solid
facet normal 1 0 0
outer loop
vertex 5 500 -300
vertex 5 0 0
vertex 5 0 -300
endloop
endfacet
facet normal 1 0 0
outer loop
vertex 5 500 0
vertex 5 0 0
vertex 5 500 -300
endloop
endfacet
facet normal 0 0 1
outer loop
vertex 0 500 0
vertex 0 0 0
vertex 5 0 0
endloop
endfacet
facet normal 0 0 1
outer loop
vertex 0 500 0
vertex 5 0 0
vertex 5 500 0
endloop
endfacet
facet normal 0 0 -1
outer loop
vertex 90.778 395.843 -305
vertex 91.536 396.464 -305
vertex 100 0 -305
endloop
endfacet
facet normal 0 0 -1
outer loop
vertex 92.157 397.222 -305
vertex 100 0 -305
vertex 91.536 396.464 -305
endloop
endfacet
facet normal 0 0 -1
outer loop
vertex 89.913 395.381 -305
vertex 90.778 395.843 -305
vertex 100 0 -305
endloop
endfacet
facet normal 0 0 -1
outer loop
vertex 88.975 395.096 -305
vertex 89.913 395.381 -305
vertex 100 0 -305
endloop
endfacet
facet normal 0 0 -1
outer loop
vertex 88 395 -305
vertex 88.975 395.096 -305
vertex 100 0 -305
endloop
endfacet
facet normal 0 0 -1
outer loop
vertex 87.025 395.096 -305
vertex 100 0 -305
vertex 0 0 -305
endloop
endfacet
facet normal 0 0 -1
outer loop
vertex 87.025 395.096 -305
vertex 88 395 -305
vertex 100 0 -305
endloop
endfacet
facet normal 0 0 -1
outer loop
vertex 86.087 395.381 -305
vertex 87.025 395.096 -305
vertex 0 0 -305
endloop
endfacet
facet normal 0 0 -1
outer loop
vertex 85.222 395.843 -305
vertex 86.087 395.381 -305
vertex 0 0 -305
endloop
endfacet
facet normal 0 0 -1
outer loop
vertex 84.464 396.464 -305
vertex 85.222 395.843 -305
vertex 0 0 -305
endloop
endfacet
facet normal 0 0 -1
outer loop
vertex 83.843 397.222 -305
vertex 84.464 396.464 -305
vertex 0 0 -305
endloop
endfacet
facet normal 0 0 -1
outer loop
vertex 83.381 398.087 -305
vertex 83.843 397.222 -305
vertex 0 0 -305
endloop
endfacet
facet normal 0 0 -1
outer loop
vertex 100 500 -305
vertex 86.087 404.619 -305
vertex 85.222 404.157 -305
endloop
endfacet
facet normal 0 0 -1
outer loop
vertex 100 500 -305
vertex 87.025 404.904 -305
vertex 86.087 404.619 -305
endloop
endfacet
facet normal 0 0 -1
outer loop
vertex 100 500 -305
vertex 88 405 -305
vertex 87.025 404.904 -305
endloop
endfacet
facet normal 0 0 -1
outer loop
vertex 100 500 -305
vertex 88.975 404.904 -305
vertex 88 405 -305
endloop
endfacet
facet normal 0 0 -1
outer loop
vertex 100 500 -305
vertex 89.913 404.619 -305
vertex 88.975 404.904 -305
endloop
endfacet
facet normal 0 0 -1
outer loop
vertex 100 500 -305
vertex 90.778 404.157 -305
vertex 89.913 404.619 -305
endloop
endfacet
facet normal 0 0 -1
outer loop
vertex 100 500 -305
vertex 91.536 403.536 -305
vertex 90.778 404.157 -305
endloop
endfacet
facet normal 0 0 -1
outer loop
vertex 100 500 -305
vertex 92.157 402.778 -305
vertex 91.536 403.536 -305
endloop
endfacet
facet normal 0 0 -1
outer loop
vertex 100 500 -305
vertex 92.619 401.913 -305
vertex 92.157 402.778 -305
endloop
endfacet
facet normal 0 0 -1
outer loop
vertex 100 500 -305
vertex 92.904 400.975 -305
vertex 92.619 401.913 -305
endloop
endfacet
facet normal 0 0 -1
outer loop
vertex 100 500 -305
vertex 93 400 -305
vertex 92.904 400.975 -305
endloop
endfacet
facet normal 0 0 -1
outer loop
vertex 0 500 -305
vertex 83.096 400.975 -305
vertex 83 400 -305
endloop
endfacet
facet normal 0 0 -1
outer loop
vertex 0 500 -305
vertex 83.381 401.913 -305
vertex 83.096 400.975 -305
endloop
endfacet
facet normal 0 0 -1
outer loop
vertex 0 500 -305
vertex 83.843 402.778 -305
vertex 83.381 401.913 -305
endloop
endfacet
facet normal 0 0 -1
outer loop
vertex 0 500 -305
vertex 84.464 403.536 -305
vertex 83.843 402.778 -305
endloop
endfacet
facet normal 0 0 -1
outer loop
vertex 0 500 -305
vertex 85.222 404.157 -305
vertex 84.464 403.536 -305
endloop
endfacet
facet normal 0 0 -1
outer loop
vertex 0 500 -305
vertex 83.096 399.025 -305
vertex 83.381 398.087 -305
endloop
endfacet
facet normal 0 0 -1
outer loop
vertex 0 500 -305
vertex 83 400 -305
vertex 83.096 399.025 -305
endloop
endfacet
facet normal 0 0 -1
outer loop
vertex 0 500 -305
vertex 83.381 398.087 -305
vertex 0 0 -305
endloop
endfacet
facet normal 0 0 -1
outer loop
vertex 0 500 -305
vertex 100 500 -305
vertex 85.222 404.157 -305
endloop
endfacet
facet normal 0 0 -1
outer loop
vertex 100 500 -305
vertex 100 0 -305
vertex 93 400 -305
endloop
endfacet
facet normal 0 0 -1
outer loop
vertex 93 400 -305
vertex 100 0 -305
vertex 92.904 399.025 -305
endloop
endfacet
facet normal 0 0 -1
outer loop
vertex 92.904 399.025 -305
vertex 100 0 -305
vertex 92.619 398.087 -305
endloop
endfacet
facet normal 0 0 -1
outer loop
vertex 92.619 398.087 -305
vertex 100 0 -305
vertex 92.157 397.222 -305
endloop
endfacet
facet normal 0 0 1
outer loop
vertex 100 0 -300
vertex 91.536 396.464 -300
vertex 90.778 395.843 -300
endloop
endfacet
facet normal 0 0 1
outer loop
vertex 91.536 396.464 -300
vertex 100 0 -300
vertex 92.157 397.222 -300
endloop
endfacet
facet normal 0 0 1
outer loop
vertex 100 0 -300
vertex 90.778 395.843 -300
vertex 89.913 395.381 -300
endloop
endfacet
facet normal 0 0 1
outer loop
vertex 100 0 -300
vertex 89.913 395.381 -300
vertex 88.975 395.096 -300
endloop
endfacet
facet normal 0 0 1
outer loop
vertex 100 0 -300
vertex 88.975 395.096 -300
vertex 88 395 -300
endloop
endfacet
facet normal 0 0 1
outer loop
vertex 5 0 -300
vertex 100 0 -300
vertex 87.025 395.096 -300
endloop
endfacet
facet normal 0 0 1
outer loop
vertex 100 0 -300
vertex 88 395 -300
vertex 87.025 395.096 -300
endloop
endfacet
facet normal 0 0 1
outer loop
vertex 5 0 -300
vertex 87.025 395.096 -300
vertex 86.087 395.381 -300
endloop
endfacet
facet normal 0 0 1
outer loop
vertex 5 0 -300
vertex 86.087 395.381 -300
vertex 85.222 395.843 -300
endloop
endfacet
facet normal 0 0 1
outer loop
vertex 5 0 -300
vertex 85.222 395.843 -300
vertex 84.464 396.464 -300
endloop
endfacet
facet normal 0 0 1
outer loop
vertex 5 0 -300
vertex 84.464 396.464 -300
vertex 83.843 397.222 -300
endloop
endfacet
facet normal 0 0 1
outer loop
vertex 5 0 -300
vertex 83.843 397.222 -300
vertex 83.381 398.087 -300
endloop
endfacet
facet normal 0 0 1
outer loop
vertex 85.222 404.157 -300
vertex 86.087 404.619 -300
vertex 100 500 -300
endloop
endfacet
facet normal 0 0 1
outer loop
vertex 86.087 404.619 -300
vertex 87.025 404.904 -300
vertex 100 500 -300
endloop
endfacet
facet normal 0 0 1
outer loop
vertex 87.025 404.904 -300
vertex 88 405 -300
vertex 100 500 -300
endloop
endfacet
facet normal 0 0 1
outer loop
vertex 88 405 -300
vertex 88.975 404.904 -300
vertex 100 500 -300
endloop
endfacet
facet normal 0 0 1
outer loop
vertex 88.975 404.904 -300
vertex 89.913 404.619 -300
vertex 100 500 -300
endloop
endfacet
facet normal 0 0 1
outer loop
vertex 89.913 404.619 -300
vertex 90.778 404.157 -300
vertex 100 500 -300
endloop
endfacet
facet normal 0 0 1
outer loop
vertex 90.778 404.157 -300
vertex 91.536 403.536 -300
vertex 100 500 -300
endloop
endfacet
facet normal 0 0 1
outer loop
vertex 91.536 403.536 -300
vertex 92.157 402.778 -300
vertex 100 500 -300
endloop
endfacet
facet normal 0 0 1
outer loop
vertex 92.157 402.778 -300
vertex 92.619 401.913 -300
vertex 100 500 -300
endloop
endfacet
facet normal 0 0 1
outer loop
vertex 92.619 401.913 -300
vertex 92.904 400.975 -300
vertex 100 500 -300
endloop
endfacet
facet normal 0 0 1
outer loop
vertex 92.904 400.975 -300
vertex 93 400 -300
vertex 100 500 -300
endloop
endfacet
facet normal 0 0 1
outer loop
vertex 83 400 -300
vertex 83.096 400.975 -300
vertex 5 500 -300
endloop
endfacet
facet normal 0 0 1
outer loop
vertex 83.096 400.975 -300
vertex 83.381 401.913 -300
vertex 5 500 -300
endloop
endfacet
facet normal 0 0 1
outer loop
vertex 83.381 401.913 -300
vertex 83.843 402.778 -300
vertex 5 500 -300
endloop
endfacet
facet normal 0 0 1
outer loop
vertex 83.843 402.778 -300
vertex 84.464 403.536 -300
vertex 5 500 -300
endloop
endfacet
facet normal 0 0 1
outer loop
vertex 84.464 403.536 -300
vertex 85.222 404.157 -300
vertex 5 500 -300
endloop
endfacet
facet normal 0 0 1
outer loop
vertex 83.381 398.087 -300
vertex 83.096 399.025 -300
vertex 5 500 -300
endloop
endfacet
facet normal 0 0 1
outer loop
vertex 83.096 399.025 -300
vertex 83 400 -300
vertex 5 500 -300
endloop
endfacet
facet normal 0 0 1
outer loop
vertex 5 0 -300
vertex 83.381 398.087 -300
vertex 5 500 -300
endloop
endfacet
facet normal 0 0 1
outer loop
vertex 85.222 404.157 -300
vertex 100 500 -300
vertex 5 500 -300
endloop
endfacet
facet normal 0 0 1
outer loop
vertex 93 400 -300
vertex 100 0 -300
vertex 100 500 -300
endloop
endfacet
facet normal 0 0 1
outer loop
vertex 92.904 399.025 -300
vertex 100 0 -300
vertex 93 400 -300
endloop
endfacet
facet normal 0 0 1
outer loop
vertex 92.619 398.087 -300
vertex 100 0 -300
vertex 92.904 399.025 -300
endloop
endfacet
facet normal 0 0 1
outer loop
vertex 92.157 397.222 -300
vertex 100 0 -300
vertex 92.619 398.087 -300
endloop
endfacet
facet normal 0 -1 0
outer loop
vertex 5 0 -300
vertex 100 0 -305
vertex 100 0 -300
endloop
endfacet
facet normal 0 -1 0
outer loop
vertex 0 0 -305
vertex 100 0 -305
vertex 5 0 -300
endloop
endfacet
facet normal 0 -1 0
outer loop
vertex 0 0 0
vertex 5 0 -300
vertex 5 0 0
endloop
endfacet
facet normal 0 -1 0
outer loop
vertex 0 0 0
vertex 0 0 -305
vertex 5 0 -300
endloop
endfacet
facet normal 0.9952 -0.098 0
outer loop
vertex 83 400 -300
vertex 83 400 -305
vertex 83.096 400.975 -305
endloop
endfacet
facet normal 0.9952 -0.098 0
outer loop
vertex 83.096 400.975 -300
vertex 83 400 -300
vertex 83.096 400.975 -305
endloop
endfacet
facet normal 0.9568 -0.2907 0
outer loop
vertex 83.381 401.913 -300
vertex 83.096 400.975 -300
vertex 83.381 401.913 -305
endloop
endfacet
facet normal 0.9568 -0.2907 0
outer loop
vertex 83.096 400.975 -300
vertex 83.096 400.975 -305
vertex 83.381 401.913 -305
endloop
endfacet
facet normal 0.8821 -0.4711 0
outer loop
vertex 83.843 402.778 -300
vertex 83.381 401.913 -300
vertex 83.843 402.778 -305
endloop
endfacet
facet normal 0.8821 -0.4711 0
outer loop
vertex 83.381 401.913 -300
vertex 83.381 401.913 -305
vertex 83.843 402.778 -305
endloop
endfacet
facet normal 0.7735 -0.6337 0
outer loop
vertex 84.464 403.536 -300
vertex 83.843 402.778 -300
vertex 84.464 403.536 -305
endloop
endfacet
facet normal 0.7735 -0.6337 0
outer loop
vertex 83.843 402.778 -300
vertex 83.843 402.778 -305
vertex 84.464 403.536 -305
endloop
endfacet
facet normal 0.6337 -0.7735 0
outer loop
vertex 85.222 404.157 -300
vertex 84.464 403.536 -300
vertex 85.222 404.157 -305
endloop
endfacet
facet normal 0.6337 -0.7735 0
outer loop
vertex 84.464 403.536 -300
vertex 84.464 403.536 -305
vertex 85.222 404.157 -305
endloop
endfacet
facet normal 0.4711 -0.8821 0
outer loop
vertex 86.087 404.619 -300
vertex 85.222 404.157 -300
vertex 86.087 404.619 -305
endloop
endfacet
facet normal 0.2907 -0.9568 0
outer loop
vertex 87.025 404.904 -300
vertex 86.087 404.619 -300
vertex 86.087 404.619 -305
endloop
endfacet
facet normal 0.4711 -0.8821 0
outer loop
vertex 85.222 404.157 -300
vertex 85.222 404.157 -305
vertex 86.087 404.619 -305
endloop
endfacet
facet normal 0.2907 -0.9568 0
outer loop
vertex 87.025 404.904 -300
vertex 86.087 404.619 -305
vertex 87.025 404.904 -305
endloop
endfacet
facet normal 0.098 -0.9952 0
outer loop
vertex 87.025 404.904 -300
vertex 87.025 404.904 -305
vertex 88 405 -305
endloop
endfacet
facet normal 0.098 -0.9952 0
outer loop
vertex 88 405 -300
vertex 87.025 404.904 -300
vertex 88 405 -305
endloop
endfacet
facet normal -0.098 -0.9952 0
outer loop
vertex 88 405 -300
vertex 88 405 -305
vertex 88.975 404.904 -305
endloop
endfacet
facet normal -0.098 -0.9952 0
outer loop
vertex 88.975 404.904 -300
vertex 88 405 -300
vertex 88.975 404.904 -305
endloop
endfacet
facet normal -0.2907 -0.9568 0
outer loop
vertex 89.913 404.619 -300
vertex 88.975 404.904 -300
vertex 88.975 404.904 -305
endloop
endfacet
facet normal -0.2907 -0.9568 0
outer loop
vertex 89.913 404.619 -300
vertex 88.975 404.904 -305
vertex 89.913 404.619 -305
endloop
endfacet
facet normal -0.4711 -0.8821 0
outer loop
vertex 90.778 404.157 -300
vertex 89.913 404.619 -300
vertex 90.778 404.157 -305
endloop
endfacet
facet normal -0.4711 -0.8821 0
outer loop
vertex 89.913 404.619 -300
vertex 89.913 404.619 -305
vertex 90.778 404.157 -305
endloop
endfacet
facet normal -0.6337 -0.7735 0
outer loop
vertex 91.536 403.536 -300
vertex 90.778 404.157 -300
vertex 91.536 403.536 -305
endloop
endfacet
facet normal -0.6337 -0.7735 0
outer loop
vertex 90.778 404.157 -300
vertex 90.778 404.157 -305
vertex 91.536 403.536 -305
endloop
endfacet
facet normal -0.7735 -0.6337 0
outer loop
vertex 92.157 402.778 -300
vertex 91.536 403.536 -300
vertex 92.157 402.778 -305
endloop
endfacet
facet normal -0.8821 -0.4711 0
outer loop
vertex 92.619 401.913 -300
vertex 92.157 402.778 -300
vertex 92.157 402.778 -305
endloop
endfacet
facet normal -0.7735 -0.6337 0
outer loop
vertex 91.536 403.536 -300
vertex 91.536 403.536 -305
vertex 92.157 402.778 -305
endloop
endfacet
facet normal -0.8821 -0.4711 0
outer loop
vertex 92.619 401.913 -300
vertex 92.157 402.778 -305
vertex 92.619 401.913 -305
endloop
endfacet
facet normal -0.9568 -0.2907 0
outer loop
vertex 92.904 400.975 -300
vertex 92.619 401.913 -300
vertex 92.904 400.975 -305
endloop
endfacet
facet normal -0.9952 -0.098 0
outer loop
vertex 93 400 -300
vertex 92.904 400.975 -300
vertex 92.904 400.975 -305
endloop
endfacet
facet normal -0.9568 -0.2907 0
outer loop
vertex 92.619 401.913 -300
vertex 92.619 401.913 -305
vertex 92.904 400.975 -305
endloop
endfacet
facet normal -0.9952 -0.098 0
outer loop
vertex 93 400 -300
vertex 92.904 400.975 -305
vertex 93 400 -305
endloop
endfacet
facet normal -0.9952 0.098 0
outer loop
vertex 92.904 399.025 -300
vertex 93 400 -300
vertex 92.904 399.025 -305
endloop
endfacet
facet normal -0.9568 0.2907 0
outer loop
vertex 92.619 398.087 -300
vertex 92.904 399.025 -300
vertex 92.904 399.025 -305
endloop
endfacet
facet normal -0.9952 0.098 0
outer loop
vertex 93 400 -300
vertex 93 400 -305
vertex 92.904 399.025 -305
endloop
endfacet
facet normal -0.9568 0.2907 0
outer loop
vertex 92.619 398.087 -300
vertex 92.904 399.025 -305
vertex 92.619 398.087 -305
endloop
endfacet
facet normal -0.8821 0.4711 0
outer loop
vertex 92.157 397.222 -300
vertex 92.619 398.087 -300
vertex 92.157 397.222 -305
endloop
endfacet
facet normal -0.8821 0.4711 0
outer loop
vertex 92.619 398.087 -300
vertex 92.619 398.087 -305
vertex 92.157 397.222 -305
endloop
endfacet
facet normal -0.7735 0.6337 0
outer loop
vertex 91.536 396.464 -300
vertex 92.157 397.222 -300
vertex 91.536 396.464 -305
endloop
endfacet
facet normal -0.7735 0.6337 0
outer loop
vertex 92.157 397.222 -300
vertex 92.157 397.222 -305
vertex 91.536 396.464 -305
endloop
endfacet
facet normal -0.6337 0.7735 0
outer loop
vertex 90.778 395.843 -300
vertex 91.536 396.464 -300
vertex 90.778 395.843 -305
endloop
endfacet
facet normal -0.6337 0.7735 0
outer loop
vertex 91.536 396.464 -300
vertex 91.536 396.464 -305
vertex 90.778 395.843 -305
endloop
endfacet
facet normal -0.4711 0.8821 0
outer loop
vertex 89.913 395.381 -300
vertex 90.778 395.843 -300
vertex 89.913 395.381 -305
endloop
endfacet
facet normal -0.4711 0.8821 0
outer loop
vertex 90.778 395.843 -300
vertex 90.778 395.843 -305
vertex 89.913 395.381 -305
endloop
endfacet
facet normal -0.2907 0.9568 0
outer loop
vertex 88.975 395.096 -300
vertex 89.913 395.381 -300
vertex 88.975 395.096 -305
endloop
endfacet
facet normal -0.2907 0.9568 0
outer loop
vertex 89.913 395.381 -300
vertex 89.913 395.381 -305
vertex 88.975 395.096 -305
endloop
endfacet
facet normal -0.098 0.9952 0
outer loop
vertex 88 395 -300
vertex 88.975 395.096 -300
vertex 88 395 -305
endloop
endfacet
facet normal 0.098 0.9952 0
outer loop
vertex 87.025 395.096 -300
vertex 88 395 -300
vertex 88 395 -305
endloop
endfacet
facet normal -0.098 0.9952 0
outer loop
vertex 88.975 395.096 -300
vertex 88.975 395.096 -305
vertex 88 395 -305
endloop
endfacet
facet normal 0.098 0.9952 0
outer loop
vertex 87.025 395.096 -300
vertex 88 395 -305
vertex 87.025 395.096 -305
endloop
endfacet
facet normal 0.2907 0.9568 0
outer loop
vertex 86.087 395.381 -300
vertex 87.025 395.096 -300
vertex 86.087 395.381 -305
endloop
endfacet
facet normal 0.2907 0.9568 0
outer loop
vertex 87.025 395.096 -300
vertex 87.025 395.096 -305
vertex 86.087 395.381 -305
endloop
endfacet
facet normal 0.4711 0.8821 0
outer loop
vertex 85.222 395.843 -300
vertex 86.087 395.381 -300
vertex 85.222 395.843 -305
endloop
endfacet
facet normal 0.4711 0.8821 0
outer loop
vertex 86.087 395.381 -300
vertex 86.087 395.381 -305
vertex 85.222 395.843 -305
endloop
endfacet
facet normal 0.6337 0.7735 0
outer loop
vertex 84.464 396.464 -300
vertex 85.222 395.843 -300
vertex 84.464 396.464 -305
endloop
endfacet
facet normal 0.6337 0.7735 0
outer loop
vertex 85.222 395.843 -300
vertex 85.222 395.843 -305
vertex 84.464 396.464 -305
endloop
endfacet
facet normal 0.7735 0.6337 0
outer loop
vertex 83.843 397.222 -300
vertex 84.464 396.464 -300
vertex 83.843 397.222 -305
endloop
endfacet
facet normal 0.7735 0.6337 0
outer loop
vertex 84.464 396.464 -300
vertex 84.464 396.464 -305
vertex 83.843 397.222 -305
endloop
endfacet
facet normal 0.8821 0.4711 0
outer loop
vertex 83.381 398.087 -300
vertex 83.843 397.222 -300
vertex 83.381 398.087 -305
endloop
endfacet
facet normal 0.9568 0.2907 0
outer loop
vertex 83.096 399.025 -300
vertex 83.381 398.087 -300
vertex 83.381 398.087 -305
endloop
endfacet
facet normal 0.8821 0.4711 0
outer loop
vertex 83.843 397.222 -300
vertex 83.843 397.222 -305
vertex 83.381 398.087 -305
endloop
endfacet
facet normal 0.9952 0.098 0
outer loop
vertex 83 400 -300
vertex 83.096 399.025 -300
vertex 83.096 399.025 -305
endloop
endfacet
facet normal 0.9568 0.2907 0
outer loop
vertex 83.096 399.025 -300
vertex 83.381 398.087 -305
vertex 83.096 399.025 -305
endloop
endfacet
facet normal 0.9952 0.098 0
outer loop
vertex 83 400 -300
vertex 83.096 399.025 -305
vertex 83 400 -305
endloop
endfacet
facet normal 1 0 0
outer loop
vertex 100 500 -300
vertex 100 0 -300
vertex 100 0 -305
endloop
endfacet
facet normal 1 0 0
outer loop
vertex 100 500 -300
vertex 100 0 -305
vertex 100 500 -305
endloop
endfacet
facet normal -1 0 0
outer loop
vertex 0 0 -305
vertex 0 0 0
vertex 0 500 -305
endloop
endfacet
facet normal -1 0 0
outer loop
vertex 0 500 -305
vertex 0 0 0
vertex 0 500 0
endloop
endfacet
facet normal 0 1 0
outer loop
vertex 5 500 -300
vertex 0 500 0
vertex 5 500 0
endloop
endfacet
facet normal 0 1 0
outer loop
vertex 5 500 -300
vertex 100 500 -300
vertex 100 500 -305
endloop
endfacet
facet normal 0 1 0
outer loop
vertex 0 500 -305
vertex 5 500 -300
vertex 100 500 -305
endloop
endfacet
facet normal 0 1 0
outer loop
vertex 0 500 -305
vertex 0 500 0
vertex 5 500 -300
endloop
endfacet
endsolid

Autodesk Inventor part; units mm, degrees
ref_plane "YZ Plane" through (0, 0, 0) normal (1, 0, 0) x (0, 1, 0)
ref_plane "XZ Plane" through (0, 0, 0) normal (0, 1, 0) x (-1, 0, 0)
ref_plane "XY Plane" through (0, 0, 0) normal (0, 0, 1) x (1, 0, 0)
sketch "Sketch1" plane through (0, 0, 0) normal (1, 0, 0) x (0, 1, 0)
  line L0 (0, 0) -> (500, 0)
  line L1 (500, 0) -> (500, -300)
  line L2 (500, -300) -> (0, -300)
  line L3 (0, -300) -> (0, 0)
  dimension "d0" = 300
  dimension "d1" = 500
extrude "Extrusion1" add sketch "Sketch1" along normal blind 5
sketch "Sketch2" plane through (0, 0, -300) normal (0, 0, -1) x (-1, 0, 0)
  line L0 (0, 0) -> (-100, 0)
  line L1 (-100, 0) -> (-100, 500)
  line L2 (-100, 500) -> (0, 500)
  line L3 (0, 500) -> (0, 0)
  point P0 (-50, 0)
  dimension "d4" = 100
  dimension "d5" = 500
extrude "Extrusion2" add sketch "Sketch2" along normal blind 5
sketch "Sketch3" plane through (0, 0, -305) normal (0, 0, -1) x (-1, 0, 0)
  circle A0 centre (-88, 400) radius 5
  line L0 (-100, 500) -> (-100, 0) projected
  line L1 (0, 500) -> (-100, 500) projected
  point P0 (0, 0)
  dimension "d8" = 10
  dimension "d9" = 12
  dimension "d10" = 100
extrude "Extrusion3" cut sketch "Sketch3" against normal blind 5
properties part number "door"
